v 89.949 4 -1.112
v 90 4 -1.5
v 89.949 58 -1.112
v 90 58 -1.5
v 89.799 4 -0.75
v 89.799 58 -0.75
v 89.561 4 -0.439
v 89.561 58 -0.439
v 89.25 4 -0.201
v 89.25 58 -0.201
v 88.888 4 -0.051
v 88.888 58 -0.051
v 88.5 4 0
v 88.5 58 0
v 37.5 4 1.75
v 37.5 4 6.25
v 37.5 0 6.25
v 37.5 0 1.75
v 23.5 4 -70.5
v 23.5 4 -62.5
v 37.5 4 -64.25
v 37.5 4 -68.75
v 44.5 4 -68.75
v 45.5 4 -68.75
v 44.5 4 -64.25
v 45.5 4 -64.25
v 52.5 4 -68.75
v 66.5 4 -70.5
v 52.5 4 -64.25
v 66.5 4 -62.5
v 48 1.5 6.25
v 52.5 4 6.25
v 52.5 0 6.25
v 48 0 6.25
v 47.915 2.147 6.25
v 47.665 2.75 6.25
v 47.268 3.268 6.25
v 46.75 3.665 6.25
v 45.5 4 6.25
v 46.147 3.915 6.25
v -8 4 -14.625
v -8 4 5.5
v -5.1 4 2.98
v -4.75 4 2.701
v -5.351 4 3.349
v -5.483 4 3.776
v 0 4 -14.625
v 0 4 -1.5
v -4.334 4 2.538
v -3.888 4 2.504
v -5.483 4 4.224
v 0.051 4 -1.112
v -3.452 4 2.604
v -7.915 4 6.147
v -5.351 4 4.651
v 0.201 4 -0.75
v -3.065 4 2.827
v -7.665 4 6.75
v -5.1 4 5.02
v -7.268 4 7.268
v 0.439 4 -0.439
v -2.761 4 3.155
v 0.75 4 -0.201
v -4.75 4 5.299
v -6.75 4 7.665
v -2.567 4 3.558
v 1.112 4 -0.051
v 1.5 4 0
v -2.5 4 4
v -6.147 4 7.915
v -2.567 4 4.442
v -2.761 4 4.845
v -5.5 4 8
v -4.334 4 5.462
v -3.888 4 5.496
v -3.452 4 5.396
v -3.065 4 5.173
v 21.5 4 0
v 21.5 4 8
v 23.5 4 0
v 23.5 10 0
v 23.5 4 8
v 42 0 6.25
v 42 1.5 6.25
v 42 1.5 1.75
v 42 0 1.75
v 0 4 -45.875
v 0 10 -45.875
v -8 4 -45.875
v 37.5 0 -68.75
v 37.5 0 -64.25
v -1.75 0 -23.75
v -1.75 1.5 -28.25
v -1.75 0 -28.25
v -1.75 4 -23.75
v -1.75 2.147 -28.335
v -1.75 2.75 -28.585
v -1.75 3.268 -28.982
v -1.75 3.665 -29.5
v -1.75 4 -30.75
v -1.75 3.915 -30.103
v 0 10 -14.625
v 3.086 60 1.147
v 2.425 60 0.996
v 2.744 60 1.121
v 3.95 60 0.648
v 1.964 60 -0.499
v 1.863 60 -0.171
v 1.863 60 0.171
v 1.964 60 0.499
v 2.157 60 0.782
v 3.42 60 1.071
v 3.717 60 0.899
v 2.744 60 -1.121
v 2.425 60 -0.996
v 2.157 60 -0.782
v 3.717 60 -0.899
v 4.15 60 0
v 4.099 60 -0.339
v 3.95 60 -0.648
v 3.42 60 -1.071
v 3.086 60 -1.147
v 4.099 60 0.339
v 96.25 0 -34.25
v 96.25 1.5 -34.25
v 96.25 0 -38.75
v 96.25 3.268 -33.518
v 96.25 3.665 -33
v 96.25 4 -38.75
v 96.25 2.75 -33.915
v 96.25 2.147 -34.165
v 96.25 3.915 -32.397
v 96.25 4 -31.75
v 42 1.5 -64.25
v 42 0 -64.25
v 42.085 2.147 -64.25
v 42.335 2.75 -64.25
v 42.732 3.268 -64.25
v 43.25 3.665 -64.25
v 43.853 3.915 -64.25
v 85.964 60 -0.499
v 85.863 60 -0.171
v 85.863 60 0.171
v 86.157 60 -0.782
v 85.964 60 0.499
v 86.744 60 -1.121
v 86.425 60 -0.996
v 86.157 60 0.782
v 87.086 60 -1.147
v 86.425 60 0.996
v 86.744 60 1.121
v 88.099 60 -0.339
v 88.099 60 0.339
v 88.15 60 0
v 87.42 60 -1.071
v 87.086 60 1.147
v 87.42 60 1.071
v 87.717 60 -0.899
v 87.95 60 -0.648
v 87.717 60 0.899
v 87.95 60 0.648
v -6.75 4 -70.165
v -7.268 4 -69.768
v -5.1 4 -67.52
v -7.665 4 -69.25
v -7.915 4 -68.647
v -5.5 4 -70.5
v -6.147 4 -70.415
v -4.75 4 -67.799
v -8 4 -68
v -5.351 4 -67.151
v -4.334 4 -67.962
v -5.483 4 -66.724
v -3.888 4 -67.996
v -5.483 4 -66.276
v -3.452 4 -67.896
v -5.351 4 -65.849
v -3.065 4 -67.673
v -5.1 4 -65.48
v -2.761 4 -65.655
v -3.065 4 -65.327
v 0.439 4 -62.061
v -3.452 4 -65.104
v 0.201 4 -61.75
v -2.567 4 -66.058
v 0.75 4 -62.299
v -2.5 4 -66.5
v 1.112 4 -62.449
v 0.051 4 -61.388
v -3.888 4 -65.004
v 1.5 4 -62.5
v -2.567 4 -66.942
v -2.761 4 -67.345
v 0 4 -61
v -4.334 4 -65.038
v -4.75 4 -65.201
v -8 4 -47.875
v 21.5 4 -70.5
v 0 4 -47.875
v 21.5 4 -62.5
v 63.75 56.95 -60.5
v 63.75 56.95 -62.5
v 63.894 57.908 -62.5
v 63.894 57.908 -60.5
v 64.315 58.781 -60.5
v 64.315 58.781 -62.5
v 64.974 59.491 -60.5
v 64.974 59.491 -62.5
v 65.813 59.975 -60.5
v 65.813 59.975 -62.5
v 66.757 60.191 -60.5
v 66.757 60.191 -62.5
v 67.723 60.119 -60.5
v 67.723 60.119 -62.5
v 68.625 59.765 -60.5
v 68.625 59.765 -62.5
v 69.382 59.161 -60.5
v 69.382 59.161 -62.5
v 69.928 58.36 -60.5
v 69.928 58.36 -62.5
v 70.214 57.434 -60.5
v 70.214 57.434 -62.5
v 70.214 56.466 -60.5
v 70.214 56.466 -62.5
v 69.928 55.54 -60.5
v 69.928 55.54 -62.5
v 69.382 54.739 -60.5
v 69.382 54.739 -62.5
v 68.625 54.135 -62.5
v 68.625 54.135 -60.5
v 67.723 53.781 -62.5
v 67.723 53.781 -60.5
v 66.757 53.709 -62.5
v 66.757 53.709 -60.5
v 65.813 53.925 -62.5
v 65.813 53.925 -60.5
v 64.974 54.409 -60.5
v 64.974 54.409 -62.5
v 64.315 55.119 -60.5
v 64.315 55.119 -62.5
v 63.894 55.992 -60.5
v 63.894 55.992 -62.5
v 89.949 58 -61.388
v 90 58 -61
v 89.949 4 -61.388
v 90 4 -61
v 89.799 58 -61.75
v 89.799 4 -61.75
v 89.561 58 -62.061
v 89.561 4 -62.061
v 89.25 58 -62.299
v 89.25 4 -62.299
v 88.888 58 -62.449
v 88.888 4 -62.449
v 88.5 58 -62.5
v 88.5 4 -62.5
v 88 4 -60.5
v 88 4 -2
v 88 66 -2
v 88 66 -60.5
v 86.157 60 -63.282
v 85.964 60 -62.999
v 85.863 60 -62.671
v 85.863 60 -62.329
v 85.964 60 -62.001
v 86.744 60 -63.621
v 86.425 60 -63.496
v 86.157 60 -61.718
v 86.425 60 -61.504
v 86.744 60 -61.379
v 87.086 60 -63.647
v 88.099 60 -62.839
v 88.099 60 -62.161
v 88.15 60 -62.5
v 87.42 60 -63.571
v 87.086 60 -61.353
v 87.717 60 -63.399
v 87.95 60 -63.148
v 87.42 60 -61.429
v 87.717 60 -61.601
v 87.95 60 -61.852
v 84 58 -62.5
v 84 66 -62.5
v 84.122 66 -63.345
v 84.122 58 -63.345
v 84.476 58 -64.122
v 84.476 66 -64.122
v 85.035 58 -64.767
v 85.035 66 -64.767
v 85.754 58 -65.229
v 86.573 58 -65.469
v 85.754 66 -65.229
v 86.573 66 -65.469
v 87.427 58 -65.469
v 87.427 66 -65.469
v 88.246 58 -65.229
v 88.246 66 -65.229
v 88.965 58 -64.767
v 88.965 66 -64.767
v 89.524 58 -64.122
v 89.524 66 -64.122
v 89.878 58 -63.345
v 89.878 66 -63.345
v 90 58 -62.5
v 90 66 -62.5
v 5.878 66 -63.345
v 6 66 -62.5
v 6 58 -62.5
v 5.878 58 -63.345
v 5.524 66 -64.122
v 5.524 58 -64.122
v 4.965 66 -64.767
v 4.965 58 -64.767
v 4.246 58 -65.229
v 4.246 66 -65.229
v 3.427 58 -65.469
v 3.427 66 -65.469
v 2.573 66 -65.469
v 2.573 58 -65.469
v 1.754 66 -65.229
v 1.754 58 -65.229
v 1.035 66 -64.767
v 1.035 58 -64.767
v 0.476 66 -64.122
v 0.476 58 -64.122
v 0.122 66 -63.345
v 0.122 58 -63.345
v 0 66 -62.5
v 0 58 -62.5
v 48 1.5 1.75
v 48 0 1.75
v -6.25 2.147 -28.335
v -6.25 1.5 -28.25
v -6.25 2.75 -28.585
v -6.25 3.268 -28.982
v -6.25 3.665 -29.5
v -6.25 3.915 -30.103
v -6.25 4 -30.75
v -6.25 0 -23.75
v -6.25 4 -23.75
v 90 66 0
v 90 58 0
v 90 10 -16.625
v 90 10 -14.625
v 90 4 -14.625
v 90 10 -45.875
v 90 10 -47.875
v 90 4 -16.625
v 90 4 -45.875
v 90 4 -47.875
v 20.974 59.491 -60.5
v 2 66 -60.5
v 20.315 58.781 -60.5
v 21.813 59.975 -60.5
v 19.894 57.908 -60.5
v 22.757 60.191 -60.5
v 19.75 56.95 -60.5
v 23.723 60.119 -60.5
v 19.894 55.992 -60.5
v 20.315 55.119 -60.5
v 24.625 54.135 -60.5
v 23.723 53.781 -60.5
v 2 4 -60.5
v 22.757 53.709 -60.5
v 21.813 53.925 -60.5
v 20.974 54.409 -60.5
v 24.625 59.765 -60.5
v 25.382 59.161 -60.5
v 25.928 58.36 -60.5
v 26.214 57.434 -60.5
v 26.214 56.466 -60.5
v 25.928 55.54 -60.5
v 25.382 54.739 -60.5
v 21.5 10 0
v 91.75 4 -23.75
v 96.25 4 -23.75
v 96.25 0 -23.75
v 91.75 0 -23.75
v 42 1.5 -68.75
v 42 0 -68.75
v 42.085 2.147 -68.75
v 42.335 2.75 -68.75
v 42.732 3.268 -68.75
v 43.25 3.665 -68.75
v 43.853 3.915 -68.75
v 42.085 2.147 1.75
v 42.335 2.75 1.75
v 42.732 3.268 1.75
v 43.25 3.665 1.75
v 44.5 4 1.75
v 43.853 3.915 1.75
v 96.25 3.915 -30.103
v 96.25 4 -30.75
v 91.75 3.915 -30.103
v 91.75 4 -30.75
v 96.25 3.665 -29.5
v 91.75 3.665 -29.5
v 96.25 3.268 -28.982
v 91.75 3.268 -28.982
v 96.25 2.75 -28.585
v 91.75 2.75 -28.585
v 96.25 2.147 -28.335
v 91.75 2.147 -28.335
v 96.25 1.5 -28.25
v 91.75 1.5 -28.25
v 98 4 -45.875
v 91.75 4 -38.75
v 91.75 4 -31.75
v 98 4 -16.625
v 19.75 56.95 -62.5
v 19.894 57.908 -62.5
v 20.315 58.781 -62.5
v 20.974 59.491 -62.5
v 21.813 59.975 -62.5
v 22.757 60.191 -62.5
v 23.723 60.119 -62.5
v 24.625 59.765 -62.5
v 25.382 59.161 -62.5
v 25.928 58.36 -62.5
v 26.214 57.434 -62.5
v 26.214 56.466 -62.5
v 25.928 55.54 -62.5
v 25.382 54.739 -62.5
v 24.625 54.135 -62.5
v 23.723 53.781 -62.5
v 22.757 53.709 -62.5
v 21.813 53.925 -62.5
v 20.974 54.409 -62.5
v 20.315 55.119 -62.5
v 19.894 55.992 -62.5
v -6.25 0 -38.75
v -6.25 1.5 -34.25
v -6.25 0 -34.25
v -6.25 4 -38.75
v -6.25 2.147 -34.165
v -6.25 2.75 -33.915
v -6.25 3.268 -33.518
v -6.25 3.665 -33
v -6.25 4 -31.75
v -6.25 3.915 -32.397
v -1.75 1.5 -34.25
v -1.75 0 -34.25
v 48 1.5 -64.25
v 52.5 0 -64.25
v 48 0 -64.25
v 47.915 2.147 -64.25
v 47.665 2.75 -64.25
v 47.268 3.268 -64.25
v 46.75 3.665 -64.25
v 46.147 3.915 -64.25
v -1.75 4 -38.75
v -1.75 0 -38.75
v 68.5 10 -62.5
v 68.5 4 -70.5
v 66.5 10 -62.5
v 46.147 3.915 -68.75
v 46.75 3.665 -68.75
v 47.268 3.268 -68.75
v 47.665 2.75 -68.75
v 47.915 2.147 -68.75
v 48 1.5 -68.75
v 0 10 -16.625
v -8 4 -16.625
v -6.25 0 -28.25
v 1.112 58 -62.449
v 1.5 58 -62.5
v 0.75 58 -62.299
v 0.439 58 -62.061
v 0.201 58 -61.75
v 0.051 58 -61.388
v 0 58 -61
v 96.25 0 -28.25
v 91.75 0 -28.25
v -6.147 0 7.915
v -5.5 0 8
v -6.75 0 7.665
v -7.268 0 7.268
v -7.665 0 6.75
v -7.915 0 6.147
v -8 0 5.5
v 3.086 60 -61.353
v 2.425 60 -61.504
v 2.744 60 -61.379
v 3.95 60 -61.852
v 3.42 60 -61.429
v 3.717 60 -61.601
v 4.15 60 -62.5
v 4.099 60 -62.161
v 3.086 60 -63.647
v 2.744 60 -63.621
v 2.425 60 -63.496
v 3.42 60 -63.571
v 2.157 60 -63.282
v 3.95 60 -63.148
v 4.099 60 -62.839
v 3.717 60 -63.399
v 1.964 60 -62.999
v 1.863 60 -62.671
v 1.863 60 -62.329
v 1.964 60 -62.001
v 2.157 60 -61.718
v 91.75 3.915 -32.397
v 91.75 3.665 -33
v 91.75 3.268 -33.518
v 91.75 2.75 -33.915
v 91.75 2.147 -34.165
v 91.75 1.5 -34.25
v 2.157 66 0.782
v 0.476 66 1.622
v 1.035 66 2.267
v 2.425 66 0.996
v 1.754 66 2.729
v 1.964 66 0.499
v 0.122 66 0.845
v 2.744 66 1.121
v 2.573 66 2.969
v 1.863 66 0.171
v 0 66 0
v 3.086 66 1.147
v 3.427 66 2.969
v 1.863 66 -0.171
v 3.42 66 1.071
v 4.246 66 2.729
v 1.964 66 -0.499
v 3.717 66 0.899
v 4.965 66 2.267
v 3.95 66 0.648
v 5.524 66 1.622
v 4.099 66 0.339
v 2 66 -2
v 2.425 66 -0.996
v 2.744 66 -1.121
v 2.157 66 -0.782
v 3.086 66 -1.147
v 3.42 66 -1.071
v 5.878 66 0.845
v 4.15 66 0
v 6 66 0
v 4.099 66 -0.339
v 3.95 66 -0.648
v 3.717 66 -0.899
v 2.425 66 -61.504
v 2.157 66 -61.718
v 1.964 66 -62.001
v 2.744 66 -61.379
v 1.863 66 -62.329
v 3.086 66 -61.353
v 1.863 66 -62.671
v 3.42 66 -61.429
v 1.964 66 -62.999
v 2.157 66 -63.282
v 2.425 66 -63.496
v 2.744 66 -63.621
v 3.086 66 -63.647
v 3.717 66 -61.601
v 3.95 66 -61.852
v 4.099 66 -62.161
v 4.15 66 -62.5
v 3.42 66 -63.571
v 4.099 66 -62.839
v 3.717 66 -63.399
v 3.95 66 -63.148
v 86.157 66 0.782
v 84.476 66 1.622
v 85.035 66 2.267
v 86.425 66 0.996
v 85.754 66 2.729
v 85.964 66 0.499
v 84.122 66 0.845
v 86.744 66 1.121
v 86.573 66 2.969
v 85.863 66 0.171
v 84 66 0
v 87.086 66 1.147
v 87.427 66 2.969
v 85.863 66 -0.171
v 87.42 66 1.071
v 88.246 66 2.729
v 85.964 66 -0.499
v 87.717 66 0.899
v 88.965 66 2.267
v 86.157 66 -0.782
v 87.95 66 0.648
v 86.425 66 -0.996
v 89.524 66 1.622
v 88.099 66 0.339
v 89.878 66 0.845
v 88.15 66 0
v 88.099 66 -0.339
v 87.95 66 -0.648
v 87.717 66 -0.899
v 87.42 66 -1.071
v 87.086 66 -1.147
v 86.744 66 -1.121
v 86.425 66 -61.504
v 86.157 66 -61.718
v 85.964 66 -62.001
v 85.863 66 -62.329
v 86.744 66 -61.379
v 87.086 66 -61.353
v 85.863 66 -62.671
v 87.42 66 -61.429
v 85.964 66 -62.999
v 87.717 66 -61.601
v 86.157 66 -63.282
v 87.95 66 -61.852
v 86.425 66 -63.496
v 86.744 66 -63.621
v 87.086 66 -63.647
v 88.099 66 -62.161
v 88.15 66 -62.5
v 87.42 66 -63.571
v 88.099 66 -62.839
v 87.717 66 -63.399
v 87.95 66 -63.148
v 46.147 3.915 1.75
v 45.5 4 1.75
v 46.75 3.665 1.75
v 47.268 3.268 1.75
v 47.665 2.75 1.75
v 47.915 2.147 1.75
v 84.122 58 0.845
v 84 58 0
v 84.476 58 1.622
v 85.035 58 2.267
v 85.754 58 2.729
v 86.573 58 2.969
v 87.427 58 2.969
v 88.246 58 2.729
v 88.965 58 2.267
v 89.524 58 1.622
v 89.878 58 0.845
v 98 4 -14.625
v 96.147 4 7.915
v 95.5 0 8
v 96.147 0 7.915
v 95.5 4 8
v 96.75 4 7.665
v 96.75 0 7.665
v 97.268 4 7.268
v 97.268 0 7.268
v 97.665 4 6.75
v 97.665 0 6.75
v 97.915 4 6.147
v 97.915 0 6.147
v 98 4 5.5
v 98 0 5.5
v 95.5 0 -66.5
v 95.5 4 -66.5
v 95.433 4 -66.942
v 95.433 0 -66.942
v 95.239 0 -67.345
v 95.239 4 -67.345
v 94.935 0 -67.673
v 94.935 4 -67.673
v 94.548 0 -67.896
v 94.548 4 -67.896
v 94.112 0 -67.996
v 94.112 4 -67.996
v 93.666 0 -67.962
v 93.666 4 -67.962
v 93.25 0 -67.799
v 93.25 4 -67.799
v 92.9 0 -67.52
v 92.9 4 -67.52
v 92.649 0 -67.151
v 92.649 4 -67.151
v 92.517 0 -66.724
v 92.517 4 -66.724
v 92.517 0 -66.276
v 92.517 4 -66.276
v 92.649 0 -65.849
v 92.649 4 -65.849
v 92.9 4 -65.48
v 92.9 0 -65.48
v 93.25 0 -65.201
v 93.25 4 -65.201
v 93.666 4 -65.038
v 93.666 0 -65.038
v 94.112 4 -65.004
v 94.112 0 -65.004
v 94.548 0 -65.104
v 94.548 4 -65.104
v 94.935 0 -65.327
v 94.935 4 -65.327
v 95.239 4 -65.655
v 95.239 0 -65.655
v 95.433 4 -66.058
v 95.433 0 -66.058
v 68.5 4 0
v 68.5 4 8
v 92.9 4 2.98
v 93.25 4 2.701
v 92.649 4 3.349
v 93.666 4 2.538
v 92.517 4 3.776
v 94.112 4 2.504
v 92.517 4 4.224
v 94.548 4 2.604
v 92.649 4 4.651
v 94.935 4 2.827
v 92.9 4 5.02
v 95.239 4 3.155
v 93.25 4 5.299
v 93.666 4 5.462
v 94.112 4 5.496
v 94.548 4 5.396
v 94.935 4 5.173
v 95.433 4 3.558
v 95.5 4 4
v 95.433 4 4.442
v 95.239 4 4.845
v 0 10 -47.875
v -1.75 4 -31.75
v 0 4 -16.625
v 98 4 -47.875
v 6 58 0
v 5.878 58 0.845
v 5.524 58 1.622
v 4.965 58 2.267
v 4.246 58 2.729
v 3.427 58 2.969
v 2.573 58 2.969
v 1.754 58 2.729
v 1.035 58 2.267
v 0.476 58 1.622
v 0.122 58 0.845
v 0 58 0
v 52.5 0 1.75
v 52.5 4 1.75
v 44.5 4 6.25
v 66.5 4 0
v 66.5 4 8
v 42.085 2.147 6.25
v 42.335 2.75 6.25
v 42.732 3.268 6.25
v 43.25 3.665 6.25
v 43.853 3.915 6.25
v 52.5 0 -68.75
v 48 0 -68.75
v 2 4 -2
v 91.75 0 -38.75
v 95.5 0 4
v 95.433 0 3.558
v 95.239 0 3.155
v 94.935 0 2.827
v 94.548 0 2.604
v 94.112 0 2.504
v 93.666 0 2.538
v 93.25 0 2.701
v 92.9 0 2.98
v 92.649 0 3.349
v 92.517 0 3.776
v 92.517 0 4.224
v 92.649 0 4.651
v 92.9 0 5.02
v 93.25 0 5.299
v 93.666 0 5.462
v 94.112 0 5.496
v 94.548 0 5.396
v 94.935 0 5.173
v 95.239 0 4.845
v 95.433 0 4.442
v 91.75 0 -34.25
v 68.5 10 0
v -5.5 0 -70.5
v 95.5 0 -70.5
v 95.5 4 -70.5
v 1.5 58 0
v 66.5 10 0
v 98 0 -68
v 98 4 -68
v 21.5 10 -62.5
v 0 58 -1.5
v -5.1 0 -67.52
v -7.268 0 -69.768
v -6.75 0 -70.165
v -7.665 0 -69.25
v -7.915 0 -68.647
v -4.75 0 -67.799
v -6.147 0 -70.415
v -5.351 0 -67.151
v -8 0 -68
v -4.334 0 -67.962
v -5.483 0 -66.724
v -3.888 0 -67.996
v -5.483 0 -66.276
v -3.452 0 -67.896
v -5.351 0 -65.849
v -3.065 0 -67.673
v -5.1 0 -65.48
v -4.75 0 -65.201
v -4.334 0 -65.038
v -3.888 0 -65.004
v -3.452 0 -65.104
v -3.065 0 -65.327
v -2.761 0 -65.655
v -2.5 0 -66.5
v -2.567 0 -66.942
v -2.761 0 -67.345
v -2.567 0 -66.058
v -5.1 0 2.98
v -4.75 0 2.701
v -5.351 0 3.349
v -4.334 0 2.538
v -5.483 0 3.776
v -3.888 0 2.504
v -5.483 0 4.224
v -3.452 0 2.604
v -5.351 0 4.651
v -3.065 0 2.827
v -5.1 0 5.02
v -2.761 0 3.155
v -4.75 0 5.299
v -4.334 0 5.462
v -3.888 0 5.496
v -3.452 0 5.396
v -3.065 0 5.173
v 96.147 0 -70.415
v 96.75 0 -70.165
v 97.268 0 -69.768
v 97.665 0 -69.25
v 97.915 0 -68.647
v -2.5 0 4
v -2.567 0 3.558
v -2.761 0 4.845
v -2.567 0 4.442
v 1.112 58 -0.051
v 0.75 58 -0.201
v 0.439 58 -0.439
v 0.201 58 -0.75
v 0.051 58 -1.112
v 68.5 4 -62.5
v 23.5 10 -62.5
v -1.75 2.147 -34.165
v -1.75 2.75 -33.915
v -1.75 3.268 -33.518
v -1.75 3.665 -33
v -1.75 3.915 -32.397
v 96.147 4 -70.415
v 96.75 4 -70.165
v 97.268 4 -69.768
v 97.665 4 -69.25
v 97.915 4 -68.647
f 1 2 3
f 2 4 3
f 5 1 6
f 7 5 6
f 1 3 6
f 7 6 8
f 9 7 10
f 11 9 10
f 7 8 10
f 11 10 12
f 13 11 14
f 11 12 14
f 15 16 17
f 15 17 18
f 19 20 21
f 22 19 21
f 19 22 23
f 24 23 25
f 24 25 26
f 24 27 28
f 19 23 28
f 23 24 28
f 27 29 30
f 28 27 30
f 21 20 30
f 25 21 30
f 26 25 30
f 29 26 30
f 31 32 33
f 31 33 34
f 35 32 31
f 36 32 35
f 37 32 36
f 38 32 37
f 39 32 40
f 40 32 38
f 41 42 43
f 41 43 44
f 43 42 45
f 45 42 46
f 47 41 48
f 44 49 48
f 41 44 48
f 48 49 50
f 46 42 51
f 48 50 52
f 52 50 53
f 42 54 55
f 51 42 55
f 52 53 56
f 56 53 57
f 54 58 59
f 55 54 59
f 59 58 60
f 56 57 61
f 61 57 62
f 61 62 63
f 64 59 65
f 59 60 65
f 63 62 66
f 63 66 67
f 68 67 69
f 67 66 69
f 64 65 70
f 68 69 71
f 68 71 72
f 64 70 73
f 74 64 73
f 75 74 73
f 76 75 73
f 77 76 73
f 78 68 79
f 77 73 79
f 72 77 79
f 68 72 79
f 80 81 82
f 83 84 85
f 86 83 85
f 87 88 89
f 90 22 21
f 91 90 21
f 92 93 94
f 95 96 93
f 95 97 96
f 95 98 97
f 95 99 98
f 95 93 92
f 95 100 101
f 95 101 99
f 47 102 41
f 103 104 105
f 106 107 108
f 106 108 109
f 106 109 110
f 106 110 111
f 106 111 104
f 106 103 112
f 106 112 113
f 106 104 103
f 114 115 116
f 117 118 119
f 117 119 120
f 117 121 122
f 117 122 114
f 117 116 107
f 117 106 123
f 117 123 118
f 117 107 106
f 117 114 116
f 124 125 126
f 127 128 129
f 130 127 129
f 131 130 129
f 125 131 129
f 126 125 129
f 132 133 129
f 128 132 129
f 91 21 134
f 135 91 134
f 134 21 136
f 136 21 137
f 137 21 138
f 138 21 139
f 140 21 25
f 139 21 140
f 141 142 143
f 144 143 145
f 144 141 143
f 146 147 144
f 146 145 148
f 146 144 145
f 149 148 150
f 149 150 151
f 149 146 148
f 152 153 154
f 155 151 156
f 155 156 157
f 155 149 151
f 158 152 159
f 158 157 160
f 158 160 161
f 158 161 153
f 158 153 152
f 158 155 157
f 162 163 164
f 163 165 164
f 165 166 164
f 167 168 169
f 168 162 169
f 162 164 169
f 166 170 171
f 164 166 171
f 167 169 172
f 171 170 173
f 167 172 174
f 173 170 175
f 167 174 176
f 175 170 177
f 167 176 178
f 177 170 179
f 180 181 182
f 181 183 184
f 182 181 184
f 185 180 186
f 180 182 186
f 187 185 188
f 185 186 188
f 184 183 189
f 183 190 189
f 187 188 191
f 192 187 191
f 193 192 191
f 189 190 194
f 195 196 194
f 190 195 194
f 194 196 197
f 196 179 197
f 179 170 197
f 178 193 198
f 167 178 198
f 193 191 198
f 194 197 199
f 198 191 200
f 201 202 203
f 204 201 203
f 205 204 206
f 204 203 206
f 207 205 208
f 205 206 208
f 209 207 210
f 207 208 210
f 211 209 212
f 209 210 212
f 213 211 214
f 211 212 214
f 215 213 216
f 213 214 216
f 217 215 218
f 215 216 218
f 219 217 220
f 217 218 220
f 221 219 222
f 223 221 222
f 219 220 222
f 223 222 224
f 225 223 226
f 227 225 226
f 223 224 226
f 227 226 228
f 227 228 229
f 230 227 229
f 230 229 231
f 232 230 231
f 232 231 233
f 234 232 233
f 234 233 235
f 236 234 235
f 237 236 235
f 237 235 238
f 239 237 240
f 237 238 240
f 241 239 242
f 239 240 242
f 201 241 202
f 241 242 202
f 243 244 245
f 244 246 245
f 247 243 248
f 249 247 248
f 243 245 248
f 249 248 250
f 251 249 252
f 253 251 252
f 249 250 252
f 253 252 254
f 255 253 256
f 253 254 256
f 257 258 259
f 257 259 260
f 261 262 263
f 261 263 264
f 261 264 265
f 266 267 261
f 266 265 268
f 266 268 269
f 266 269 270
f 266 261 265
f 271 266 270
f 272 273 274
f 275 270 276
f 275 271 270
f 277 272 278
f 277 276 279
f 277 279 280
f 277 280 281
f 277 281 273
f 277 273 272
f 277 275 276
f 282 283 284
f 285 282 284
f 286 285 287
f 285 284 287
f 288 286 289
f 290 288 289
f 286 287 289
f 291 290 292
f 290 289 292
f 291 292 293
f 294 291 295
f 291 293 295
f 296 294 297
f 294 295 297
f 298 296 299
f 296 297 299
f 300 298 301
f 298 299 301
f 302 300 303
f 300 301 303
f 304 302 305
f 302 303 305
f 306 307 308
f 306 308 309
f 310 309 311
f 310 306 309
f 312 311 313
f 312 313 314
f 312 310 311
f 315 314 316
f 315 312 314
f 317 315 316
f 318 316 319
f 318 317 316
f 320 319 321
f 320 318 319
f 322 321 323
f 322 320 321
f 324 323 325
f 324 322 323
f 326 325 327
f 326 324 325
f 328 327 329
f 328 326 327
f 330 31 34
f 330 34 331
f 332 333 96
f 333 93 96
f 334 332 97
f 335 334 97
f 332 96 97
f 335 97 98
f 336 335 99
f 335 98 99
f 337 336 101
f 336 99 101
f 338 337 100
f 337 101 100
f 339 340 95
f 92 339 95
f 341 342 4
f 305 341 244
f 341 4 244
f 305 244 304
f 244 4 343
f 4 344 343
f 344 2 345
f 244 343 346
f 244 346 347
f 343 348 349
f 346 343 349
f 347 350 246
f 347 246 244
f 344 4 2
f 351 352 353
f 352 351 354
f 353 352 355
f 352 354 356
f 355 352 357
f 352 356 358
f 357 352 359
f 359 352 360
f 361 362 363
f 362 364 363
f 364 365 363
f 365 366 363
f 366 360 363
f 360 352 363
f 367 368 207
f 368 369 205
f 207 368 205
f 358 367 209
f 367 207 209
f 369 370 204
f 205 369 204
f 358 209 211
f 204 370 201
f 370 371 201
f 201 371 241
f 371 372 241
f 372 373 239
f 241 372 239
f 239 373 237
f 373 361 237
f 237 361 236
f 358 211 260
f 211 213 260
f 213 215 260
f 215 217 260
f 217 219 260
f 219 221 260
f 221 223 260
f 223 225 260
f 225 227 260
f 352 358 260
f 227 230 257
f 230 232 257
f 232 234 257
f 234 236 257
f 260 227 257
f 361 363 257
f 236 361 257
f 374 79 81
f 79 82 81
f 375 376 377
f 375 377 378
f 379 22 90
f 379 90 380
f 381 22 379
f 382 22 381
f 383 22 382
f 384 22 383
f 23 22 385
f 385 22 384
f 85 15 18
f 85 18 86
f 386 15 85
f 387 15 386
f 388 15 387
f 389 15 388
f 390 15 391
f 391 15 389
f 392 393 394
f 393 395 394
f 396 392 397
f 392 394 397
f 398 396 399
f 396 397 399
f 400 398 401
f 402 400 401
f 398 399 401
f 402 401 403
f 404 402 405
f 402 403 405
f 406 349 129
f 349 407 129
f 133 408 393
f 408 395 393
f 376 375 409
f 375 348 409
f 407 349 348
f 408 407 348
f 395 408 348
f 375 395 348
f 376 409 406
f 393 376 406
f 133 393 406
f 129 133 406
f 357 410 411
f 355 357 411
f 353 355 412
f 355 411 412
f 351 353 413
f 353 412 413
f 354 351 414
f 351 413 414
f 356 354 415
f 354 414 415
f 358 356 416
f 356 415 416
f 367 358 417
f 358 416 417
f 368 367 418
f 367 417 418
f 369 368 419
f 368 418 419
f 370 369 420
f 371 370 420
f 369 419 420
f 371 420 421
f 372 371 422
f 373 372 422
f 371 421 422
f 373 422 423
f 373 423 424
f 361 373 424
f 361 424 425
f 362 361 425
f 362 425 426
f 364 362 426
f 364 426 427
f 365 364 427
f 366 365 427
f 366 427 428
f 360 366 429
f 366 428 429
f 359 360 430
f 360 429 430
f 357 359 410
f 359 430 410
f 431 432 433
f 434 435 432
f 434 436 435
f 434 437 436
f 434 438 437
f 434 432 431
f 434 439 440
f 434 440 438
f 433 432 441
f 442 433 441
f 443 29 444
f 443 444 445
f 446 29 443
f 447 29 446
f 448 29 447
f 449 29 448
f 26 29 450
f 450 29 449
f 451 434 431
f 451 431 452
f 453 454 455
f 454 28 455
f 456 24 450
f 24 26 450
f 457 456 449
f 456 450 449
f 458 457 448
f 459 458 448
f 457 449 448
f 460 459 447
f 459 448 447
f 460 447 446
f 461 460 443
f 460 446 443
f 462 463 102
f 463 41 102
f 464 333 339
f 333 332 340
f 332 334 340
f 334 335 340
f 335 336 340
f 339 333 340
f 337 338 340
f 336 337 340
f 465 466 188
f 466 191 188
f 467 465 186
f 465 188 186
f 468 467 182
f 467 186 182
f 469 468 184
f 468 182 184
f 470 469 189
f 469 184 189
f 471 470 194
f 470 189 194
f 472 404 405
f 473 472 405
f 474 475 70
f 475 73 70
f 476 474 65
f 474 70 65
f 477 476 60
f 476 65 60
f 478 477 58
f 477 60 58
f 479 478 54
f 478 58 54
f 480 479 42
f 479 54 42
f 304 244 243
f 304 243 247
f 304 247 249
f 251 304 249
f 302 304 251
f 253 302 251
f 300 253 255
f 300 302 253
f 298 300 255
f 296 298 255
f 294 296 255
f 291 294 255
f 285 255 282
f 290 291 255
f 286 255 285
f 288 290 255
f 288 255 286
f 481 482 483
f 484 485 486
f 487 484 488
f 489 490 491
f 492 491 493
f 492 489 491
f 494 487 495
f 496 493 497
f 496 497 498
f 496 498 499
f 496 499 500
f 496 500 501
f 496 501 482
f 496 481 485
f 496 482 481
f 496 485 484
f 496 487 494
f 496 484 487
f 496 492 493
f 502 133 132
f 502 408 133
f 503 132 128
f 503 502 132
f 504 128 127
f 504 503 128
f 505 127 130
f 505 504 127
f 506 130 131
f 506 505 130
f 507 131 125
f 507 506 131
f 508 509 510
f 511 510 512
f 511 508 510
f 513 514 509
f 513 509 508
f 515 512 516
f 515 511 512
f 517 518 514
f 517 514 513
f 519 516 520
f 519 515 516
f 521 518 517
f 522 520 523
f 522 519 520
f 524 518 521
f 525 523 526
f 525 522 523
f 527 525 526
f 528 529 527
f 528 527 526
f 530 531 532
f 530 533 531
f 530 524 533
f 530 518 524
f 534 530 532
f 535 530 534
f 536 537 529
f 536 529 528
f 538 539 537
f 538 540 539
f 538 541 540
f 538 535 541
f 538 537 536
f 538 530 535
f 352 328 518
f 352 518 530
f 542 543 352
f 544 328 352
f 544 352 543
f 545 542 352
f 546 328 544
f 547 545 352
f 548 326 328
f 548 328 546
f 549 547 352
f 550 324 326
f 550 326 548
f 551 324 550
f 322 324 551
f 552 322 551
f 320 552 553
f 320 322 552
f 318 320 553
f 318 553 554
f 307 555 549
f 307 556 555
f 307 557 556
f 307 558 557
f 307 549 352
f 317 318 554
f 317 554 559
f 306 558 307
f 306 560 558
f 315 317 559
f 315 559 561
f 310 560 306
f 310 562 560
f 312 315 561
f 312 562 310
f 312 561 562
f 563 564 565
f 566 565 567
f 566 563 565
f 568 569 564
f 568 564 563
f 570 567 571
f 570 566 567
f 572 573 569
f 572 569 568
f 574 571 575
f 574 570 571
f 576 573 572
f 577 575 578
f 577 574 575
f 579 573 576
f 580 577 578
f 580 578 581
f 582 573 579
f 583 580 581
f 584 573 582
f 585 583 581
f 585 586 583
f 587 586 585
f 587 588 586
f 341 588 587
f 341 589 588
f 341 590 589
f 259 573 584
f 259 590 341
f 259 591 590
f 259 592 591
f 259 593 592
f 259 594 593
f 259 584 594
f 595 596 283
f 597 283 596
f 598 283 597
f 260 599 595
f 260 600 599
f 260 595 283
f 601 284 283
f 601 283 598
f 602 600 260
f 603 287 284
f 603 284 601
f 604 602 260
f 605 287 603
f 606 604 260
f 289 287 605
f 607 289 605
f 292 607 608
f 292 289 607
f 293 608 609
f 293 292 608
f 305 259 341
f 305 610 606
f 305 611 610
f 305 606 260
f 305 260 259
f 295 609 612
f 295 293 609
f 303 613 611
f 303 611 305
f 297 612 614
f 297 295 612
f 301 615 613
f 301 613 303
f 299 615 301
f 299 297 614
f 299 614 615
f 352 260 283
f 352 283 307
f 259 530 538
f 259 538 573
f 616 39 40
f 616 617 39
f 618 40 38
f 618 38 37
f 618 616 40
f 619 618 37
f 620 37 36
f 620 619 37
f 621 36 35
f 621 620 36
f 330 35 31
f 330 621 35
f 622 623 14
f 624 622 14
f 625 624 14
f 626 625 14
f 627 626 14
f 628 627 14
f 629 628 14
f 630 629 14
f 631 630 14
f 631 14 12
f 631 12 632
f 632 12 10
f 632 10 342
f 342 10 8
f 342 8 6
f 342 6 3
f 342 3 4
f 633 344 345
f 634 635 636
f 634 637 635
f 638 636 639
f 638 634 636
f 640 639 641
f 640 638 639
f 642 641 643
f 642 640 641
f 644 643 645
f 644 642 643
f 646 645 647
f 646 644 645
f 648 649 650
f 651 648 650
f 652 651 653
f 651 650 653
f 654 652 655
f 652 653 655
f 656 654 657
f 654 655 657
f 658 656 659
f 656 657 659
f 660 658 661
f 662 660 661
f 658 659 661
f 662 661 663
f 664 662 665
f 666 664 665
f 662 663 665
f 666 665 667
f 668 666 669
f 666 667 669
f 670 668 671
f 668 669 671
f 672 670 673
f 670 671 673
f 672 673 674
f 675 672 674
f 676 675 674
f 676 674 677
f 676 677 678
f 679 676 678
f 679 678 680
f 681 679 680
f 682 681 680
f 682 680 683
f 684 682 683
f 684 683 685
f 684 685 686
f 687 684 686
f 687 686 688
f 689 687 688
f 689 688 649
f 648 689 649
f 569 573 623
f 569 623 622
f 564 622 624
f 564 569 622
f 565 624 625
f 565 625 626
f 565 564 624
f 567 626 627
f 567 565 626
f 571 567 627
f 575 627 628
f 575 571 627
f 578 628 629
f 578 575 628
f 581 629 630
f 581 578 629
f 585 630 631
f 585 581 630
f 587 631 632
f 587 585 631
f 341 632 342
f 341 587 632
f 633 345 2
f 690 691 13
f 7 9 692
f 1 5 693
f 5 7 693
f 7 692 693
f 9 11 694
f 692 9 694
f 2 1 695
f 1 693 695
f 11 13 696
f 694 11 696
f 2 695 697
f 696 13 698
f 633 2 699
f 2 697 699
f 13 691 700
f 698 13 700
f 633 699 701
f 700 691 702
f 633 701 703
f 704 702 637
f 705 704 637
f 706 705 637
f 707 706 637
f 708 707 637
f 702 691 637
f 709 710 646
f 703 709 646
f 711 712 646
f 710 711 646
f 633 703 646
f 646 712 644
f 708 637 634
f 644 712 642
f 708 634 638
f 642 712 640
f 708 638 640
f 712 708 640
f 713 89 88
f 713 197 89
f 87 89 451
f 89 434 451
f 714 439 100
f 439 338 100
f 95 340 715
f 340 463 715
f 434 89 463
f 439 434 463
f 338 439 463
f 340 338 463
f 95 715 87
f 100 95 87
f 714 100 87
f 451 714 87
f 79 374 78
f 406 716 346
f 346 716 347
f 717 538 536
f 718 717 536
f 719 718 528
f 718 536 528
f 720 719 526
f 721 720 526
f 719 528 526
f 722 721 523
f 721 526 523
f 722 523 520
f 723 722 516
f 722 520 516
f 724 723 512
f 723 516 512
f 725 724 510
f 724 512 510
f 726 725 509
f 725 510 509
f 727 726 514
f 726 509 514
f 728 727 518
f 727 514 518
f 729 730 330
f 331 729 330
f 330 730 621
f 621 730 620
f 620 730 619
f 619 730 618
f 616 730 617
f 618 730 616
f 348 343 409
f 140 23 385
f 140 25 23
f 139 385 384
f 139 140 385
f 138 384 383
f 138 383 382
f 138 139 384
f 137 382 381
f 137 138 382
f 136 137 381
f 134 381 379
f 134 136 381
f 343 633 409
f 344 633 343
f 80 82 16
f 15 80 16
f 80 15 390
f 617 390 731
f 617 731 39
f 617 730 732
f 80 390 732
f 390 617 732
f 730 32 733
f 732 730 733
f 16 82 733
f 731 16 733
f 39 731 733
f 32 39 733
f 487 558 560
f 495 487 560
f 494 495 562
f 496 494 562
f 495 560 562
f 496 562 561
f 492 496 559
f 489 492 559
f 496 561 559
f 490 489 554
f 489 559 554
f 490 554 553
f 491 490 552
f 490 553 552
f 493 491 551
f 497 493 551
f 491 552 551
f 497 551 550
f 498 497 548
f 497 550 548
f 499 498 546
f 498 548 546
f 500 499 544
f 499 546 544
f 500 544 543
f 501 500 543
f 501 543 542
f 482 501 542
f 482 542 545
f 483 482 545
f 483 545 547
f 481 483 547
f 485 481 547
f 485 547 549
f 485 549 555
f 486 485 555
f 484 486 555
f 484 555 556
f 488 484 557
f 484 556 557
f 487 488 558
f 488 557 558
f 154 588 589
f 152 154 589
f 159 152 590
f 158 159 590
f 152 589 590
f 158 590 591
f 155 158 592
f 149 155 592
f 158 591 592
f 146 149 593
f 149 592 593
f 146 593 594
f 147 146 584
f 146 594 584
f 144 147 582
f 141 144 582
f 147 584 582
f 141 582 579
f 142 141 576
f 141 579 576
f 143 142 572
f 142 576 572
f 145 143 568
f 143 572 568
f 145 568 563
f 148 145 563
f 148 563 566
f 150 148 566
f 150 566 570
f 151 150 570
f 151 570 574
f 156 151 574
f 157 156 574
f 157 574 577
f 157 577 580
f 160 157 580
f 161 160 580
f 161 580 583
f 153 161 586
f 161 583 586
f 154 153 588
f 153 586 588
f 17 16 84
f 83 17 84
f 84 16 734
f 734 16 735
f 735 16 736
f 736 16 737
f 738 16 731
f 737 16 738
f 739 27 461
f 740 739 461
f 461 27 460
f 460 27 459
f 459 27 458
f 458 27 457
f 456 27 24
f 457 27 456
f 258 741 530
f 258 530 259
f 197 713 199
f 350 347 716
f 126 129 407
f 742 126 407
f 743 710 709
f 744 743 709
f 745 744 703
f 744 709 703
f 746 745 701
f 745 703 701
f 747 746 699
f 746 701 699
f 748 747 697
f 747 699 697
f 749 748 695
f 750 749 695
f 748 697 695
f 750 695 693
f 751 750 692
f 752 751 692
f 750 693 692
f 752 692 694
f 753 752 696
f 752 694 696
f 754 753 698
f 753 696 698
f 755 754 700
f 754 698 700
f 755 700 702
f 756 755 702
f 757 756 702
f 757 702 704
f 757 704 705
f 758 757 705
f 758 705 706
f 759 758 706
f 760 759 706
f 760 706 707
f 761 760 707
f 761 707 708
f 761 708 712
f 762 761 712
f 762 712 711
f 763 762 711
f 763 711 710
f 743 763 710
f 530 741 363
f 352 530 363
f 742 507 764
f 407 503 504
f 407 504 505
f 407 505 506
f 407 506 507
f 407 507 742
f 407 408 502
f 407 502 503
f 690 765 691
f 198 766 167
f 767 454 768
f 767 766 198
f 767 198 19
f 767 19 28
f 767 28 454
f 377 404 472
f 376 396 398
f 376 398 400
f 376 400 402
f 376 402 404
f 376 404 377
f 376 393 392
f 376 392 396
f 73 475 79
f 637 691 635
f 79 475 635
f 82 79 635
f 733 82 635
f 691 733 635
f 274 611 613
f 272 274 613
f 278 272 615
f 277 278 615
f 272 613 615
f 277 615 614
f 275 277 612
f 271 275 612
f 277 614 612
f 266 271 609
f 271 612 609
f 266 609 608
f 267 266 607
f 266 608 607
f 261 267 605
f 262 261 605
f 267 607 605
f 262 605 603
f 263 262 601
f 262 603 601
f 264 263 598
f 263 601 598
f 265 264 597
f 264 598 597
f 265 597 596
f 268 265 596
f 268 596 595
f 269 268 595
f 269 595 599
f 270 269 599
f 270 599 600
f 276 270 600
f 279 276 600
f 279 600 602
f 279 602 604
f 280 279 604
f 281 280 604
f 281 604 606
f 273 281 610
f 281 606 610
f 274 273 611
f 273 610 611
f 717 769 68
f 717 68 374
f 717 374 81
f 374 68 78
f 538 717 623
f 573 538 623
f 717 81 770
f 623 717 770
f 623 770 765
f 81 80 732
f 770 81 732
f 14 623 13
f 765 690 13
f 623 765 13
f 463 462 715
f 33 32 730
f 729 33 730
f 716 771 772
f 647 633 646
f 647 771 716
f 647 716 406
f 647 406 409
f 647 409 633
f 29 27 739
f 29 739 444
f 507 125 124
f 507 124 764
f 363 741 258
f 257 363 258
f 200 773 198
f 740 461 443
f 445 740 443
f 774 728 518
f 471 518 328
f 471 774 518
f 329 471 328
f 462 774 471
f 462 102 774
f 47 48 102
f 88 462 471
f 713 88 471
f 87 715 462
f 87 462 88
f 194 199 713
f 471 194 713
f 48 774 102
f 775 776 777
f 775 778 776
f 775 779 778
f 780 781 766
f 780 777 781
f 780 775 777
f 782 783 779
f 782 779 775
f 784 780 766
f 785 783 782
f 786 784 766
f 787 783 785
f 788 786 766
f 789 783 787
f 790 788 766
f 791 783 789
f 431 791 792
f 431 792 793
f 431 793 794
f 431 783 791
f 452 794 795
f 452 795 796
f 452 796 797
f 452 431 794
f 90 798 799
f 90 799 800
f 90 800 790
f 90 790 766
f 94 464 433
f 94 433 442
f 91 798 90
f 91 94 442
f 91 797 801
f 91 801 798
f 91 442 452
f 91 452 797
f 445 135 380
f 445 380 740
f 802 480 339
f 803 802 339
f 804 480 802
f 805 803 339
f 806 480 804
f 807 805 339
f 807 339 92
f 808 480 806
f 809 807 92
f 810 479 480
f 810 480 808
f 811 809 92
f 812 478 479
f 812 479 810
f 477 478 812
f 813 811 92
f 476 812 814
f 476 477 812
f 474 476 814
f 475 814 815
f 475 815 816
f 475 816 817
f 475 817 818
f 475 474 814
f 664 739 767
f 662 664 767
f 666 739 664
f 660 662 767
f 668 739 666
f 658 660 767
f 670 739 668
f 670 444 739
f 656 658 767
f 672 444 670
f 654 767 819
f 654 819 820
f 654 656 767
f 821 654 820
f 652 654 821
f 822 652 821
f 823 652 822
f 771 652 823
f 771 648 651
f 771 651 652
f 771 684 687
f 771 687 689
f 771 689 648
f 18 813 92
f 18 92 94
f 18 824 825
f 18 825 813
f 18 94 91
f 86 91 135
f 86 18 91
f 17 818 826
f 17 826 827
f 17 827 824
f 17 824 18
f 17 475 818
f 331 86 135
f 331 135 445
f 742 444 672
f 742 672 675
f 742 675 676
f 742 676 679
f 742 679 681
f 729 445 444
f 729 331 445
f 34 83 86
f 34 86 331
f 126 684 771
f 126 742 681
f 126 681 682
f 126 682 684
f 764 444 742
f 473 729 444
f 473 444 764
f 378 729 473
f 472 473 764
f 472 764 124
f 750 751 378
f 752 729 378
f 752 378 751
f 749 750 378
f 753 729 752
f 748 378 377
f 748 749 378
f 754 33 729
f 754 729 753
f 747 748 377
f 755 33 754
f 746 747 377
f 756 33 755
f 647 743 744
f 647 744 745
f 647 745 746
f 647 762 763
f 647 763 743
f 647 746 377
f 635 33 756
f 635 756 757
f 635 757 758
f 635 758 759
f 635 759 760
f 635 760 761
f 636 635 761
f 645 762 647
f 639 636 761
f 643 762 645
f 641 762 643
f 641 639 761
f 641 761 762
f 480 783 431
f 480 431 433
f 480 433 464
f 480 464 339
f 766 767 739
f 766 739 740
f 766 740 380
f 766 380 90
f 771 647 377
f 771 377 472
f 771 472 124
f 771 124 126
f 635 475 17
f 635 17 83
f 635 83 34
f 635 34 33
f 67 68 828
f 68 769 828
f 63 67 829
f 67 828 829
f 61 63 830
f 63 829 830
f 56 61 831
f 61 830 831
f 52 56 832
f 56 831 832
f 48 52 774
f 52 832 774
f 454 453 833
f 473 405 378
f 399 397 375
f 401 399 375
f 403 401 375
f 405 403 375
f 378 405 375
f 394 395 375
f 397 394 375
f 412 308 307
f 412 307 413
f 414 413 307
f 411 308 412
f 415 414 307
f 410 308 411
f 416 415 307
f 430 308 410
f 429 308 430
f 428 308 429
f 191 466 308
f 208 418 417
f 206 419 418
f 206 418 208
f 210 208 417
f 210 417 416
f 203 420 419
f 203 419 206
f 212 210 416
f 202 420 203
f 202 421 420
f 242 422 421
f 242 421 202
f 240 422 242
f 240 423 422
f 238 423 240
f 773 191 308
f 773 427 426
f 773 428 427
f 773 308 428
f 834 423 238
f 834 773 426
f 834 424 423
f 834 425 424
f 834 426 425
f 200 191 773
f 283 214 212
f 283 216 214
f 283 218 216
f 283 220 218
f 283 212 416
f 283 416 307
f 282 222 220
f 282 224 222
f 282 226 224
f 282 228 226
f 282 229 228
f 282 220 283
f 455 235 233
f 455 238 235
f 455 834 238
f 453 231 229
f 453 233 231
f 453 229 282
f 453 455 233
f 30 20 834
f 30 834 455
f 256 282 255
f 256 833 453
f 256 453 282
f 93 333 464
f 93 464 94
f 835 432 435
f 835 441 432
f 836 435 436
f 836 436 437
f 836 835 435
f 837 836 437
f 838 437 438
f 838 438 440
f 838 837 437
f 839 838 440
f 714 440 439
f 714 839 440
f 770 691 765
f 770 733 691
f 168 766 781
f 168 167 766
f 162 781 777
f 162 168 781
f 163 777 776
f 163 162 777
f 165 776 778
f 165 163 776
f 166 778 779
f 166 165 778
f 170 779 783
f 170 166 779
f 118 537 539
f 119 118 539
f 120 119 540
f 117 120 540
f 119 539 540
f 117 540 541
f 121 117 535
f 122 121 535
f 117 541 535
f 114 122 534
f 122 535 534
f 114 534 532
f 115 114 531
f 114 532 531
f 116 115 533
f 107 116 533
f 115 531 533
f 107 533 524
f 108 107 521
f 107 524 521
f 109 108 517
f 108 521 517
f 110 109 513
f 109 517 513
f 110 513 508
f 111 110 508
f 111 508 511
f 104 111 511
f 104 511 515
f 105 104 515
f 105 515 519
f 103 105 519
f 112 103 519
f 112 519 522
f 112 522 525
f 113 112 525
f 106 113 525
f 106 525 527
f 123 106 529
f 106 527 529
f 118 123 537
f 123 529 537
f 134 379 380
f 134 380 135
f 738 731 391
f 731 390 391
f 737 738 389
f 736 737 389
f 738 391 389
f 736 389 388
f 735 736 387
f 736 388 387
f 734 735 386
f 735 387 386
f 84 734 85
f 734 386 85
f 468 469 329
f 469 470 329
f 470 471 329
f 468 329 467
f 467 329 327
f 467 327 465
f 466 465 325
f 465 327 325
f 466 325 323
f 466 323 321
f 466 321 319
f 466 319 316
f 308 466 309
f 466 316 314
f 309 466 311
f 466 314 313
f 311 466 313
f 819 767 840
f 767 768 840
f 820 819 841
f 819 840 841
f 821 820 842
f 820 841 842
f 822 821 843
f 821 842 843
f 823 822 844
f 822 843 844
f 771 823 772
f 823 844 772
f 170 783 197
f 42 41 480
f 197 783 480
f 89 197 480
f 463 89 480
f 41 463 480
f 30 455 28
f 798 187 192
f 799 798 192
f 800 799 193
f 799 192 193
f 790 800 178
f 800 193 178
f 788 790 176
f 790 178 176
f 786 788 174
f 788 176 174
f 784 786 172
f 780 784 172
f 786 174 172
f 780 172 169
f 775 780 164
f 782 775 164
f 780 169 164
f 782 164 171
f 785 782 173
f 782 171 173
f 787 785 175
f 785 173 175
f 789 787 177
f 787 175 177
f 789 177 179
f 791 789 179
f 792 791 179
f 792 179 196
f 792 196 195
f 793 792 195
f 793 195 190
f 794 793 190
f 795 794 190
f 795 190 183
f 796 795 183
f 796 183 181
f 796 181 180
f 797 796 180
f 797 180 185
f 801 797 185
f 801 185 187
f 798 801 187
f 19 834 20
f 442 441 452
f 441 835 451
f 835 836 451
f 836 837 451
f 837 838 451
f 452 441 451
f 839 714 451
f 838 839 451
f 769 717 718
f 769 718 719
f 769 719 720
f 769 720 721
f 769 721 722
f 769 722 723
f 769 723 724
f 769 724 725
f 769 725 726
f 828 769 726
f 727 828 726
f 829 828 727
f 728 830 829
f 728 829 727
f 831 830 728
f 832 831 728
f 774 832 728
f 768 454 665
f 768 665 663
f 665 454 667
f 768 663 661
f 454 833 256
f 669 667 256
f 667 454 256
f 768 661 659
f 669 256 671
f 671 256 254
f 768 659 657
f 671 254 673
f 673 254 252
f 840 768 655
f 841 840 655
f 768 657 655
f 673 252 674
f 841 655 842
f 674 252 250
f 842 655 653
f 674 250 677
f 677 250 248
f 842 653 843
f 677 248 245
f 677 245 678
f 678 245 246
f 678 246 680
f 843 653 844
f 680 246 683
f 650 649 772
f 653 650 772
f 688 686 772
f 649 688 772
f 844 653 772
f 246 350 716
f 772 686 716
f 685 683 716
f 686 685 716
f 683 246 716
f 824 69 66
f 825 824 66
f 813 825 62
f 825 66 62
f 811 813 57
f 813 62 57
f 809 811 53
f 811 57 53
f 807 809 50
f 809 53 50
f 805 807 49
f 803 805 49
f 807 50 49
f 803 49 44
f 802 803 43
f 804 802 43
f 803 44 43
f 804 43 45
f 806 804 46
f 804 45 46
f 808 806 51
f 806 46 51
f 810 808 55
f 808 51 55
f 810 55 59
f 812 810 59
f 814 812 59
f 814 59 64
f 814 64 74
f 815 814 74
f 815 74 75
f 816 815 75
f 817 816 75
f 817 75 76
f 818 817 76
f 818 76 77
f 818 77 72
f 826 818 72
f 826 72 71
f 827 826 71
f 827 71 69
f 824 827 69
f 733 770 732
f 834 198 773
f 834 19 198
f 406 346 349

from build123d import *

# Parameters (mm, degrees)
BASE_W                                       = 90
BASE_H                                       = 62.5
BASE_EXTRUDE_DEPTH                           = 2
WALLS_W                                      = 90
WALLS_H                                      = 62.5
WALLS_W_2                                    = 86
WALLS_H_2                                    = 58.5
WALLS_EXTRUDE_DEPTH                          = 64
OUTJUT_EXTRUDE_DEPTH                         = 8
HOLES_R                                      = 1.15
HOLES_CUT_DEPTH                              = 6
ANTENNA_GPS_HOLES_R                          = 3.25
ANTENNA_GPS_HOLES_CUT_DEPTH                  = 2
PAD_W                                        = 106
PAD_H                                        = 78.5
PAD_EXTRUDE_DEPTH                            = 4
SCREW_HOLES_R                                = 1.5
SCREW_HOLES_CUT_DEPTH                        = 5
WALL_FILLETS_R                               = 1.5
LENGTH_SUPPORTS_EXTRUDE_DEPTH                = 1
LENGTH_SUPPORT_EXTRUDE_OPPOSING_MIRR_2_DEPTH = 1
WIDTH_SUPPORTS_EXTRUDE_DEPTH                 = 1
WIDTH_SUPPORTS_EXTRUDE_OPPOSING_MIRR_2_DEPTH = 1
ZIP_TIE_HOLE_W                               = 4.5
ZIP_TIE_HOLE_H                               = 4.5
ZIP_TIE_HOLE_LENGTH_CUT_DEPTH                = 5
ZIP_TIE_HOLE_LENGTH_OPPOSING_MIRROR_COPY_W   = 4.5
ZIP_TIE_HOLE_LENGTH_OPPOSING_MIRROR_COPY_H   = 4.5
ZIP_TIE_HOLE_LENGTH_OPPOSING_MIRROR_2_DEPTH  = 5
ZIP_TIE_HOLE_WIDTH_W                         = 4.5
ZIP_TIE_HOLE_WIDTH_H                         = 4.5
ZIP_TIE_HOLE_WIDTH_CUT_DEPTH                 = 5
ZIP_TIE_HOLE_WIDTH_OPPOSING_MIRROR_COPY_W    = 4.5
ZIP_TIE_HOLE_WIDTH_OPPOSING_MIRROR_COPY_H    = 4.5
ZIP_TIE_HOLE_WIDTH_OPPOSING_MIRROR_C_2_DEPTH = 5
ZIP_TIE_FILLETS_R                            = 2.5
PAD_FILLETS_R                                = 2.5


with BuildPart() as part:
    # Base → Base Extrude (new body)
    with BuildSketch(Plane(origin=(0, 0, 0), x_dir=(1, 0, 0), z_dir=(0, 1, 0))):
        with Locations((45, 31.25)):
            Rectangle(BASE_W, BASE_H)
    extrude(amount=BASE_EXTRUDE_DEPTH)

    # Walls → Walls Extrude (add)
    with BuildSketch(Plane(origin=(0, 2, 0), x_dir=(1, 0, 0), z_dir=(0, 1, 0))):
        with Locations((45, 31.25)):
            Rectangle(WALLS_W, WALLS_H)
        with Locations((45, 31.25)):
            Rectangle(WALLS_W_2, WALLS_H_2, mode=Mode.SUBTRACT)
    extrude(amount=WALLS_EXTRUDE_DEPTH)

    # Outjut → Outjut Extrude (add)
    with BuildSketch(Plane(origin=(0, 66, 0), x_dir=(1, 0, 0), z_dir=(0, 1, 0))):
        with BuildLine():
            Line((0, 62.5), (6, 62.5))
            ThreePointArc((6, 62.5), (3, 65.5), (0, 62.5))
        make_face()
        with BuildLine():
            Line((90, 62.5), (84, 62.5))
            ThreePointArc((84, 62.5), (87, 65.5), (90, 62.5))
        make_face()
        with BuildLine():
            Line((90, 0), (84, 0))
            ThreePointArc((84, 0), (87, -3), (90, 0))
        make_face()
        with BuildLine():
            Line((0, 0), (6, 0))
            ThreePointArc((6, 0), (3, -3), (0, 0))
        make_face()
    extrude(amount=-OUTJUT_EXTRUDE_DEPTH)

    # Holes → Holes Cut (cut)
    with BuildSketch(Plane(origin=(0, 66, 0), x_dir=(1, 0, 0), z_dir=(0, 1, 0))):
        with Locations((3, 62.5)):
            Circle(HOLES_R)
        with Locations((87, 62.5)):
            Circle(HOLES_R)
        with Locations((87, 0)):
            Circle(HOLES_R)
        with Locations((3, 0)):
            Circle(HOLES_R)
    extrude(amount=-HOLES_CUT_DEPTH, mode=Mode.SUBTRACT)

    # Antenna/GPS Holes → Antenna/GPS Holes Cut (cut)
    with BuildSketch(Plane(origin=(0, 0, -62.5), x_dir=(-1, 0, 0), z_dir=(0, 0, -1))):
        with Locations((-23, 56.95)):
            Circle(ANTENNA_GPS_HOLES_R)
        with Locations((-67, 56.95)):
            Circle(ANTENNA_GPS_HOLES_R)
    extrude(amount=-ANTENNA_GPS_HOLES_CUT_DEPTH, mode=Mode.SUBTRACT)

    # Pad → Pad Extrude (add)
    with BuildSketch(Plane.XZ):
        with Locations((45, -31.25)):
            Rectangle(PAD_W, PAD_H)
    extrude(amount=-PAD_EXTRUDE_DEPTH)

    # Screw Holes → Screw Holes Cut (cut, through all)
    with BuildSketch(Plane(origin=(0, 4, 0), x_dir=(1, 0, 0), z_dir=(0, 1, 0))):
        with Locations((94, 66.5)):
            Circle(SCREW_HOLES_R)
        with Locations((-4, 66.5)):
            Circle(SCREW_HOLES_R)
        with Locations((94, -4)):
            Circle(SCREW_HOLES_R)
        with Locations((-4, -4)):
            Circle(SCREW_HOLES_R)
    extrude(amount=-SCREW_HOLES_CUT_DEPTH, mode=Mode.SUBTRACT)

    # Wall Fillets
    wall_fillets_edges = [part.edges().sort_by_distance(p)[0] for p in [
        (0, 31, 0),
        (0, 31, -62.5),
        (90, 31, -62.5),
        (90, 31, 0),
    ]]
    fillet(wall_fillets_edges, radius=WALL_FILLETS_R)

    # Length Supports → Length Supports Extrude (add, symmetric)
    with BuildSketch(Plane(origin=(22.5, 0, 0), x_dir=(0, 0, -1), z_dir=(1, 0, 0))):
        Polygon((0, 4), (-8, 4), (0, 10), align=None)
    length_supports_extrude = extrude(amount=LENGTH_SUPPORTS_EXTRUDE_DEPTH, both=True)

    # Length Support Extrude Mirror: Length Supports Extrude across plane
    add(length_supports_extrude.mirror(Plane(origin=(45, 0, 0), x_dir=(0, 0, 1), z_dir=(1, 0, 0))))

    # Length Support Extrude Opposing Mirror: Length Supports Extrude across plane
    add(length_supports_extrude.mirror(Plane.XY.offset(-31.25)))

    # Length Support Extrude Opposing Mirror c → Length Support Extrude Opposing Mirr 2 (add, symmetric)
    with BuildSketch(Plane(origin=(67.5, 0, -62.5), x_dir=(0, 0, 1), z_dir=(-1, 0, 0))):
        Polygon((0, 4), (-8, 4), (0, 10), align=None)
    extrude(amount=LENGTH_SUPPORT_EXTRUDE_OPPOSING_MIRR_2_DEPTH, both=True)

    # Width Supports → Width Supports Extrude (add, symmetric)
    with BuildSketch(Plane.XY.offset(-15.625)):
        Polygon((0, 4), (-8, 4), (0, 10), align=None)
    width_supports_extrude = extrude(amount=WIDTH_SUPPORTS_EXTRUDE_DEPTH, both=True)

    # Width Supports Extrude Mirror: Width Supports Extrude across plane
    add(width_supports_extrude.mirror(Plane.XY.offset(-31.25)))

    # Width Supports Extrude Opposing Mirror: Width Supports Extrude across plane
    add(width_supports_extrude.mirror(Plane(origin=(45, 0, 0), x_dir=(0, 0, 1), z_dir=(1, 0, 0))))

    # Width Supports Extrude Opposing Mirror c → Width Supports Extrude Opposing Mirr 2 (add, symmetric)
    with BuildSketch(Plane(origin=(90, 0, -46.875), x_dir=(-1, 0, 0), z_dir=(0, 0, -1))):
        Polygon((0, 4), (-8, 4), (0, 10), align=None)
    extrude(amount=WIDTH_SUPPORTS_EXTRUDE_OPPOSING_MIRR_2_DEPTH, both=True)

    # Zip Tie Hole → Zip Tie Hole Length Cut (cut, through all)
    with BuildSketch(Plane(origin=(0, 4, 0), x_dir=(1, 0, 0), z_dir=(0, 1, 0))):
        with Locations((39.75, -4)):
            Rectangle(ZIP_TIE_HOLE_W, ZIP_TIE_HOLE_H)
    zip_tie_hole_length_cut = extrude(amount=-ZIP_TIE_HOLE_LENGTH_CUT_DEPTH, mode=Mode.SUBTRACT)

    # Zip Tie Hole Length Mirror: Zip Tie Hole Length Cut across plane
    add(zip_tie_hole_length_cut.mirror(Plane(origin=(45, 0, 0), x_dir=(0, 0, 1), z_dir=(1, 0, 0))), mode=Mode.SUBTRACT)

    # Zip Tie Hole Length Opposing Mirror: Zip Tie Hole Length Cut across plane
    add(zip_tie_hole_length_cut.mirror(Plane.XY.offset(-31.25)), mode=Mode.SUBTRACT)

    # Zip Tie Hole Length Opposing Mirror copy → Zip Tie Hole Length Opposing Mirror  2 (cut, through all)
    with BuildSketch(Plane(origin=(90, 4, -62.5), x_dir=(-1, 0, 0), z_dir=(0, 1, 0))):
        with Locations((39.75, -4)):
            Rectangle(ZIP_TIE_HOLE_LENGTH_OPPOSING_MIRROR_COPY_W, ZIP_TIE_HOLE_LENGTH_OPPOSING_MIRROR_COPY_H)
    extrude(amount=-ZIP_TIE_HOLE_LENGTH_OPPOSING_MIRROR_2_DEPTH, mode=Mode.SUBTRACT)

    # Zip Tie Hole Width → Zip Tie Hole Width Cut (cut, through all)
    with BuildSketch(Plane(origin=(0, 4, 0), x_dir=(1, 0, 0), z_dir=(0, 1, 0))):
        with Locations((-4, 36.5)):
            Rectangle(ZIP_TIE_HOLE_WIDTH_W, ZIP_TIE_HOLE_WIDTH_H)
    zip_tie_hole_width_cut = extrude(amount=-ZIP_TIE_HOLE_WIDTH_CUT_DEPTH, mode=Mode.SUBTRACT)

    # Zip Tie Hole Width Mirror: Zip Tie Hole Width Cut across plane
    add(zip_tie_hole_width_cut.mirror(Plane.XY.offset(-31.25)), mode=Mode.SUBTRACT)

    # Zip Tie Hole Width Opposing Mirror: Zip Tie Hole Width Cut across plane
    add(zip_tie_hole_width_cut.mirror(Plane(origin=(45, 0, 0), x_dir=(0, 0, 1), z_dir=(1, 0, 0))), mode=Mode.SUBTRACT)

    # Zip Tie Hole Width Opposing Mirror copy → Zip Tie Hole Width Opposing Mirror c 2 (cut, through all)
    with BuildSketch(Plane(origin=(90, 4, -62.5), x_dir=(-1, 0, 0), z_dir=(0, 1, 0))):
        with Locations((-4, 36.5)):
            Rectangle(ZIP_TIE_HOLE_WIDTH_OPPOSING_MIRROR_COPY_W, ZIP_TIE_HOLE_WIDTH_OPPOSING_MIRROR_COPY_H)
    extrude(amount=-ZIP_TIE_HOLE_WIDTH_OPPOSING_MIRROR_C_2_DEPTH, mode=Mode.SUBTRACT)

    # Zip Tie Fillets
    zip_tie_fillets_edges = [part.edges().sort_by_distance(p)[0] for p in [
        (42, 4, 4),
        (48, 4, 4),
        (42, 4, -66.5),
        (48, 4, -66.5),
        (-4, 4, -34.25),
        (-4, 4, -28.25),
        (94, 4, -34.25),
        (94, 4, -28.25),
    ]]
    fillet(zip_tie_fillets_edges, radius=ZIP_TIE_FILLETS_R)

    # Pad Fillets
    pad_fillets_edges = [part.edges().sort_by_distance(p)[0] for p in [
        (-8, 2, -70.5),
        (-8, 2, 8),
        (98, 2, 8),
        (98, 2, -70.5),
    ]]
    fillet(pad_fillets_edges, radius=PAD_FILLETS_R)


solid = part.part
